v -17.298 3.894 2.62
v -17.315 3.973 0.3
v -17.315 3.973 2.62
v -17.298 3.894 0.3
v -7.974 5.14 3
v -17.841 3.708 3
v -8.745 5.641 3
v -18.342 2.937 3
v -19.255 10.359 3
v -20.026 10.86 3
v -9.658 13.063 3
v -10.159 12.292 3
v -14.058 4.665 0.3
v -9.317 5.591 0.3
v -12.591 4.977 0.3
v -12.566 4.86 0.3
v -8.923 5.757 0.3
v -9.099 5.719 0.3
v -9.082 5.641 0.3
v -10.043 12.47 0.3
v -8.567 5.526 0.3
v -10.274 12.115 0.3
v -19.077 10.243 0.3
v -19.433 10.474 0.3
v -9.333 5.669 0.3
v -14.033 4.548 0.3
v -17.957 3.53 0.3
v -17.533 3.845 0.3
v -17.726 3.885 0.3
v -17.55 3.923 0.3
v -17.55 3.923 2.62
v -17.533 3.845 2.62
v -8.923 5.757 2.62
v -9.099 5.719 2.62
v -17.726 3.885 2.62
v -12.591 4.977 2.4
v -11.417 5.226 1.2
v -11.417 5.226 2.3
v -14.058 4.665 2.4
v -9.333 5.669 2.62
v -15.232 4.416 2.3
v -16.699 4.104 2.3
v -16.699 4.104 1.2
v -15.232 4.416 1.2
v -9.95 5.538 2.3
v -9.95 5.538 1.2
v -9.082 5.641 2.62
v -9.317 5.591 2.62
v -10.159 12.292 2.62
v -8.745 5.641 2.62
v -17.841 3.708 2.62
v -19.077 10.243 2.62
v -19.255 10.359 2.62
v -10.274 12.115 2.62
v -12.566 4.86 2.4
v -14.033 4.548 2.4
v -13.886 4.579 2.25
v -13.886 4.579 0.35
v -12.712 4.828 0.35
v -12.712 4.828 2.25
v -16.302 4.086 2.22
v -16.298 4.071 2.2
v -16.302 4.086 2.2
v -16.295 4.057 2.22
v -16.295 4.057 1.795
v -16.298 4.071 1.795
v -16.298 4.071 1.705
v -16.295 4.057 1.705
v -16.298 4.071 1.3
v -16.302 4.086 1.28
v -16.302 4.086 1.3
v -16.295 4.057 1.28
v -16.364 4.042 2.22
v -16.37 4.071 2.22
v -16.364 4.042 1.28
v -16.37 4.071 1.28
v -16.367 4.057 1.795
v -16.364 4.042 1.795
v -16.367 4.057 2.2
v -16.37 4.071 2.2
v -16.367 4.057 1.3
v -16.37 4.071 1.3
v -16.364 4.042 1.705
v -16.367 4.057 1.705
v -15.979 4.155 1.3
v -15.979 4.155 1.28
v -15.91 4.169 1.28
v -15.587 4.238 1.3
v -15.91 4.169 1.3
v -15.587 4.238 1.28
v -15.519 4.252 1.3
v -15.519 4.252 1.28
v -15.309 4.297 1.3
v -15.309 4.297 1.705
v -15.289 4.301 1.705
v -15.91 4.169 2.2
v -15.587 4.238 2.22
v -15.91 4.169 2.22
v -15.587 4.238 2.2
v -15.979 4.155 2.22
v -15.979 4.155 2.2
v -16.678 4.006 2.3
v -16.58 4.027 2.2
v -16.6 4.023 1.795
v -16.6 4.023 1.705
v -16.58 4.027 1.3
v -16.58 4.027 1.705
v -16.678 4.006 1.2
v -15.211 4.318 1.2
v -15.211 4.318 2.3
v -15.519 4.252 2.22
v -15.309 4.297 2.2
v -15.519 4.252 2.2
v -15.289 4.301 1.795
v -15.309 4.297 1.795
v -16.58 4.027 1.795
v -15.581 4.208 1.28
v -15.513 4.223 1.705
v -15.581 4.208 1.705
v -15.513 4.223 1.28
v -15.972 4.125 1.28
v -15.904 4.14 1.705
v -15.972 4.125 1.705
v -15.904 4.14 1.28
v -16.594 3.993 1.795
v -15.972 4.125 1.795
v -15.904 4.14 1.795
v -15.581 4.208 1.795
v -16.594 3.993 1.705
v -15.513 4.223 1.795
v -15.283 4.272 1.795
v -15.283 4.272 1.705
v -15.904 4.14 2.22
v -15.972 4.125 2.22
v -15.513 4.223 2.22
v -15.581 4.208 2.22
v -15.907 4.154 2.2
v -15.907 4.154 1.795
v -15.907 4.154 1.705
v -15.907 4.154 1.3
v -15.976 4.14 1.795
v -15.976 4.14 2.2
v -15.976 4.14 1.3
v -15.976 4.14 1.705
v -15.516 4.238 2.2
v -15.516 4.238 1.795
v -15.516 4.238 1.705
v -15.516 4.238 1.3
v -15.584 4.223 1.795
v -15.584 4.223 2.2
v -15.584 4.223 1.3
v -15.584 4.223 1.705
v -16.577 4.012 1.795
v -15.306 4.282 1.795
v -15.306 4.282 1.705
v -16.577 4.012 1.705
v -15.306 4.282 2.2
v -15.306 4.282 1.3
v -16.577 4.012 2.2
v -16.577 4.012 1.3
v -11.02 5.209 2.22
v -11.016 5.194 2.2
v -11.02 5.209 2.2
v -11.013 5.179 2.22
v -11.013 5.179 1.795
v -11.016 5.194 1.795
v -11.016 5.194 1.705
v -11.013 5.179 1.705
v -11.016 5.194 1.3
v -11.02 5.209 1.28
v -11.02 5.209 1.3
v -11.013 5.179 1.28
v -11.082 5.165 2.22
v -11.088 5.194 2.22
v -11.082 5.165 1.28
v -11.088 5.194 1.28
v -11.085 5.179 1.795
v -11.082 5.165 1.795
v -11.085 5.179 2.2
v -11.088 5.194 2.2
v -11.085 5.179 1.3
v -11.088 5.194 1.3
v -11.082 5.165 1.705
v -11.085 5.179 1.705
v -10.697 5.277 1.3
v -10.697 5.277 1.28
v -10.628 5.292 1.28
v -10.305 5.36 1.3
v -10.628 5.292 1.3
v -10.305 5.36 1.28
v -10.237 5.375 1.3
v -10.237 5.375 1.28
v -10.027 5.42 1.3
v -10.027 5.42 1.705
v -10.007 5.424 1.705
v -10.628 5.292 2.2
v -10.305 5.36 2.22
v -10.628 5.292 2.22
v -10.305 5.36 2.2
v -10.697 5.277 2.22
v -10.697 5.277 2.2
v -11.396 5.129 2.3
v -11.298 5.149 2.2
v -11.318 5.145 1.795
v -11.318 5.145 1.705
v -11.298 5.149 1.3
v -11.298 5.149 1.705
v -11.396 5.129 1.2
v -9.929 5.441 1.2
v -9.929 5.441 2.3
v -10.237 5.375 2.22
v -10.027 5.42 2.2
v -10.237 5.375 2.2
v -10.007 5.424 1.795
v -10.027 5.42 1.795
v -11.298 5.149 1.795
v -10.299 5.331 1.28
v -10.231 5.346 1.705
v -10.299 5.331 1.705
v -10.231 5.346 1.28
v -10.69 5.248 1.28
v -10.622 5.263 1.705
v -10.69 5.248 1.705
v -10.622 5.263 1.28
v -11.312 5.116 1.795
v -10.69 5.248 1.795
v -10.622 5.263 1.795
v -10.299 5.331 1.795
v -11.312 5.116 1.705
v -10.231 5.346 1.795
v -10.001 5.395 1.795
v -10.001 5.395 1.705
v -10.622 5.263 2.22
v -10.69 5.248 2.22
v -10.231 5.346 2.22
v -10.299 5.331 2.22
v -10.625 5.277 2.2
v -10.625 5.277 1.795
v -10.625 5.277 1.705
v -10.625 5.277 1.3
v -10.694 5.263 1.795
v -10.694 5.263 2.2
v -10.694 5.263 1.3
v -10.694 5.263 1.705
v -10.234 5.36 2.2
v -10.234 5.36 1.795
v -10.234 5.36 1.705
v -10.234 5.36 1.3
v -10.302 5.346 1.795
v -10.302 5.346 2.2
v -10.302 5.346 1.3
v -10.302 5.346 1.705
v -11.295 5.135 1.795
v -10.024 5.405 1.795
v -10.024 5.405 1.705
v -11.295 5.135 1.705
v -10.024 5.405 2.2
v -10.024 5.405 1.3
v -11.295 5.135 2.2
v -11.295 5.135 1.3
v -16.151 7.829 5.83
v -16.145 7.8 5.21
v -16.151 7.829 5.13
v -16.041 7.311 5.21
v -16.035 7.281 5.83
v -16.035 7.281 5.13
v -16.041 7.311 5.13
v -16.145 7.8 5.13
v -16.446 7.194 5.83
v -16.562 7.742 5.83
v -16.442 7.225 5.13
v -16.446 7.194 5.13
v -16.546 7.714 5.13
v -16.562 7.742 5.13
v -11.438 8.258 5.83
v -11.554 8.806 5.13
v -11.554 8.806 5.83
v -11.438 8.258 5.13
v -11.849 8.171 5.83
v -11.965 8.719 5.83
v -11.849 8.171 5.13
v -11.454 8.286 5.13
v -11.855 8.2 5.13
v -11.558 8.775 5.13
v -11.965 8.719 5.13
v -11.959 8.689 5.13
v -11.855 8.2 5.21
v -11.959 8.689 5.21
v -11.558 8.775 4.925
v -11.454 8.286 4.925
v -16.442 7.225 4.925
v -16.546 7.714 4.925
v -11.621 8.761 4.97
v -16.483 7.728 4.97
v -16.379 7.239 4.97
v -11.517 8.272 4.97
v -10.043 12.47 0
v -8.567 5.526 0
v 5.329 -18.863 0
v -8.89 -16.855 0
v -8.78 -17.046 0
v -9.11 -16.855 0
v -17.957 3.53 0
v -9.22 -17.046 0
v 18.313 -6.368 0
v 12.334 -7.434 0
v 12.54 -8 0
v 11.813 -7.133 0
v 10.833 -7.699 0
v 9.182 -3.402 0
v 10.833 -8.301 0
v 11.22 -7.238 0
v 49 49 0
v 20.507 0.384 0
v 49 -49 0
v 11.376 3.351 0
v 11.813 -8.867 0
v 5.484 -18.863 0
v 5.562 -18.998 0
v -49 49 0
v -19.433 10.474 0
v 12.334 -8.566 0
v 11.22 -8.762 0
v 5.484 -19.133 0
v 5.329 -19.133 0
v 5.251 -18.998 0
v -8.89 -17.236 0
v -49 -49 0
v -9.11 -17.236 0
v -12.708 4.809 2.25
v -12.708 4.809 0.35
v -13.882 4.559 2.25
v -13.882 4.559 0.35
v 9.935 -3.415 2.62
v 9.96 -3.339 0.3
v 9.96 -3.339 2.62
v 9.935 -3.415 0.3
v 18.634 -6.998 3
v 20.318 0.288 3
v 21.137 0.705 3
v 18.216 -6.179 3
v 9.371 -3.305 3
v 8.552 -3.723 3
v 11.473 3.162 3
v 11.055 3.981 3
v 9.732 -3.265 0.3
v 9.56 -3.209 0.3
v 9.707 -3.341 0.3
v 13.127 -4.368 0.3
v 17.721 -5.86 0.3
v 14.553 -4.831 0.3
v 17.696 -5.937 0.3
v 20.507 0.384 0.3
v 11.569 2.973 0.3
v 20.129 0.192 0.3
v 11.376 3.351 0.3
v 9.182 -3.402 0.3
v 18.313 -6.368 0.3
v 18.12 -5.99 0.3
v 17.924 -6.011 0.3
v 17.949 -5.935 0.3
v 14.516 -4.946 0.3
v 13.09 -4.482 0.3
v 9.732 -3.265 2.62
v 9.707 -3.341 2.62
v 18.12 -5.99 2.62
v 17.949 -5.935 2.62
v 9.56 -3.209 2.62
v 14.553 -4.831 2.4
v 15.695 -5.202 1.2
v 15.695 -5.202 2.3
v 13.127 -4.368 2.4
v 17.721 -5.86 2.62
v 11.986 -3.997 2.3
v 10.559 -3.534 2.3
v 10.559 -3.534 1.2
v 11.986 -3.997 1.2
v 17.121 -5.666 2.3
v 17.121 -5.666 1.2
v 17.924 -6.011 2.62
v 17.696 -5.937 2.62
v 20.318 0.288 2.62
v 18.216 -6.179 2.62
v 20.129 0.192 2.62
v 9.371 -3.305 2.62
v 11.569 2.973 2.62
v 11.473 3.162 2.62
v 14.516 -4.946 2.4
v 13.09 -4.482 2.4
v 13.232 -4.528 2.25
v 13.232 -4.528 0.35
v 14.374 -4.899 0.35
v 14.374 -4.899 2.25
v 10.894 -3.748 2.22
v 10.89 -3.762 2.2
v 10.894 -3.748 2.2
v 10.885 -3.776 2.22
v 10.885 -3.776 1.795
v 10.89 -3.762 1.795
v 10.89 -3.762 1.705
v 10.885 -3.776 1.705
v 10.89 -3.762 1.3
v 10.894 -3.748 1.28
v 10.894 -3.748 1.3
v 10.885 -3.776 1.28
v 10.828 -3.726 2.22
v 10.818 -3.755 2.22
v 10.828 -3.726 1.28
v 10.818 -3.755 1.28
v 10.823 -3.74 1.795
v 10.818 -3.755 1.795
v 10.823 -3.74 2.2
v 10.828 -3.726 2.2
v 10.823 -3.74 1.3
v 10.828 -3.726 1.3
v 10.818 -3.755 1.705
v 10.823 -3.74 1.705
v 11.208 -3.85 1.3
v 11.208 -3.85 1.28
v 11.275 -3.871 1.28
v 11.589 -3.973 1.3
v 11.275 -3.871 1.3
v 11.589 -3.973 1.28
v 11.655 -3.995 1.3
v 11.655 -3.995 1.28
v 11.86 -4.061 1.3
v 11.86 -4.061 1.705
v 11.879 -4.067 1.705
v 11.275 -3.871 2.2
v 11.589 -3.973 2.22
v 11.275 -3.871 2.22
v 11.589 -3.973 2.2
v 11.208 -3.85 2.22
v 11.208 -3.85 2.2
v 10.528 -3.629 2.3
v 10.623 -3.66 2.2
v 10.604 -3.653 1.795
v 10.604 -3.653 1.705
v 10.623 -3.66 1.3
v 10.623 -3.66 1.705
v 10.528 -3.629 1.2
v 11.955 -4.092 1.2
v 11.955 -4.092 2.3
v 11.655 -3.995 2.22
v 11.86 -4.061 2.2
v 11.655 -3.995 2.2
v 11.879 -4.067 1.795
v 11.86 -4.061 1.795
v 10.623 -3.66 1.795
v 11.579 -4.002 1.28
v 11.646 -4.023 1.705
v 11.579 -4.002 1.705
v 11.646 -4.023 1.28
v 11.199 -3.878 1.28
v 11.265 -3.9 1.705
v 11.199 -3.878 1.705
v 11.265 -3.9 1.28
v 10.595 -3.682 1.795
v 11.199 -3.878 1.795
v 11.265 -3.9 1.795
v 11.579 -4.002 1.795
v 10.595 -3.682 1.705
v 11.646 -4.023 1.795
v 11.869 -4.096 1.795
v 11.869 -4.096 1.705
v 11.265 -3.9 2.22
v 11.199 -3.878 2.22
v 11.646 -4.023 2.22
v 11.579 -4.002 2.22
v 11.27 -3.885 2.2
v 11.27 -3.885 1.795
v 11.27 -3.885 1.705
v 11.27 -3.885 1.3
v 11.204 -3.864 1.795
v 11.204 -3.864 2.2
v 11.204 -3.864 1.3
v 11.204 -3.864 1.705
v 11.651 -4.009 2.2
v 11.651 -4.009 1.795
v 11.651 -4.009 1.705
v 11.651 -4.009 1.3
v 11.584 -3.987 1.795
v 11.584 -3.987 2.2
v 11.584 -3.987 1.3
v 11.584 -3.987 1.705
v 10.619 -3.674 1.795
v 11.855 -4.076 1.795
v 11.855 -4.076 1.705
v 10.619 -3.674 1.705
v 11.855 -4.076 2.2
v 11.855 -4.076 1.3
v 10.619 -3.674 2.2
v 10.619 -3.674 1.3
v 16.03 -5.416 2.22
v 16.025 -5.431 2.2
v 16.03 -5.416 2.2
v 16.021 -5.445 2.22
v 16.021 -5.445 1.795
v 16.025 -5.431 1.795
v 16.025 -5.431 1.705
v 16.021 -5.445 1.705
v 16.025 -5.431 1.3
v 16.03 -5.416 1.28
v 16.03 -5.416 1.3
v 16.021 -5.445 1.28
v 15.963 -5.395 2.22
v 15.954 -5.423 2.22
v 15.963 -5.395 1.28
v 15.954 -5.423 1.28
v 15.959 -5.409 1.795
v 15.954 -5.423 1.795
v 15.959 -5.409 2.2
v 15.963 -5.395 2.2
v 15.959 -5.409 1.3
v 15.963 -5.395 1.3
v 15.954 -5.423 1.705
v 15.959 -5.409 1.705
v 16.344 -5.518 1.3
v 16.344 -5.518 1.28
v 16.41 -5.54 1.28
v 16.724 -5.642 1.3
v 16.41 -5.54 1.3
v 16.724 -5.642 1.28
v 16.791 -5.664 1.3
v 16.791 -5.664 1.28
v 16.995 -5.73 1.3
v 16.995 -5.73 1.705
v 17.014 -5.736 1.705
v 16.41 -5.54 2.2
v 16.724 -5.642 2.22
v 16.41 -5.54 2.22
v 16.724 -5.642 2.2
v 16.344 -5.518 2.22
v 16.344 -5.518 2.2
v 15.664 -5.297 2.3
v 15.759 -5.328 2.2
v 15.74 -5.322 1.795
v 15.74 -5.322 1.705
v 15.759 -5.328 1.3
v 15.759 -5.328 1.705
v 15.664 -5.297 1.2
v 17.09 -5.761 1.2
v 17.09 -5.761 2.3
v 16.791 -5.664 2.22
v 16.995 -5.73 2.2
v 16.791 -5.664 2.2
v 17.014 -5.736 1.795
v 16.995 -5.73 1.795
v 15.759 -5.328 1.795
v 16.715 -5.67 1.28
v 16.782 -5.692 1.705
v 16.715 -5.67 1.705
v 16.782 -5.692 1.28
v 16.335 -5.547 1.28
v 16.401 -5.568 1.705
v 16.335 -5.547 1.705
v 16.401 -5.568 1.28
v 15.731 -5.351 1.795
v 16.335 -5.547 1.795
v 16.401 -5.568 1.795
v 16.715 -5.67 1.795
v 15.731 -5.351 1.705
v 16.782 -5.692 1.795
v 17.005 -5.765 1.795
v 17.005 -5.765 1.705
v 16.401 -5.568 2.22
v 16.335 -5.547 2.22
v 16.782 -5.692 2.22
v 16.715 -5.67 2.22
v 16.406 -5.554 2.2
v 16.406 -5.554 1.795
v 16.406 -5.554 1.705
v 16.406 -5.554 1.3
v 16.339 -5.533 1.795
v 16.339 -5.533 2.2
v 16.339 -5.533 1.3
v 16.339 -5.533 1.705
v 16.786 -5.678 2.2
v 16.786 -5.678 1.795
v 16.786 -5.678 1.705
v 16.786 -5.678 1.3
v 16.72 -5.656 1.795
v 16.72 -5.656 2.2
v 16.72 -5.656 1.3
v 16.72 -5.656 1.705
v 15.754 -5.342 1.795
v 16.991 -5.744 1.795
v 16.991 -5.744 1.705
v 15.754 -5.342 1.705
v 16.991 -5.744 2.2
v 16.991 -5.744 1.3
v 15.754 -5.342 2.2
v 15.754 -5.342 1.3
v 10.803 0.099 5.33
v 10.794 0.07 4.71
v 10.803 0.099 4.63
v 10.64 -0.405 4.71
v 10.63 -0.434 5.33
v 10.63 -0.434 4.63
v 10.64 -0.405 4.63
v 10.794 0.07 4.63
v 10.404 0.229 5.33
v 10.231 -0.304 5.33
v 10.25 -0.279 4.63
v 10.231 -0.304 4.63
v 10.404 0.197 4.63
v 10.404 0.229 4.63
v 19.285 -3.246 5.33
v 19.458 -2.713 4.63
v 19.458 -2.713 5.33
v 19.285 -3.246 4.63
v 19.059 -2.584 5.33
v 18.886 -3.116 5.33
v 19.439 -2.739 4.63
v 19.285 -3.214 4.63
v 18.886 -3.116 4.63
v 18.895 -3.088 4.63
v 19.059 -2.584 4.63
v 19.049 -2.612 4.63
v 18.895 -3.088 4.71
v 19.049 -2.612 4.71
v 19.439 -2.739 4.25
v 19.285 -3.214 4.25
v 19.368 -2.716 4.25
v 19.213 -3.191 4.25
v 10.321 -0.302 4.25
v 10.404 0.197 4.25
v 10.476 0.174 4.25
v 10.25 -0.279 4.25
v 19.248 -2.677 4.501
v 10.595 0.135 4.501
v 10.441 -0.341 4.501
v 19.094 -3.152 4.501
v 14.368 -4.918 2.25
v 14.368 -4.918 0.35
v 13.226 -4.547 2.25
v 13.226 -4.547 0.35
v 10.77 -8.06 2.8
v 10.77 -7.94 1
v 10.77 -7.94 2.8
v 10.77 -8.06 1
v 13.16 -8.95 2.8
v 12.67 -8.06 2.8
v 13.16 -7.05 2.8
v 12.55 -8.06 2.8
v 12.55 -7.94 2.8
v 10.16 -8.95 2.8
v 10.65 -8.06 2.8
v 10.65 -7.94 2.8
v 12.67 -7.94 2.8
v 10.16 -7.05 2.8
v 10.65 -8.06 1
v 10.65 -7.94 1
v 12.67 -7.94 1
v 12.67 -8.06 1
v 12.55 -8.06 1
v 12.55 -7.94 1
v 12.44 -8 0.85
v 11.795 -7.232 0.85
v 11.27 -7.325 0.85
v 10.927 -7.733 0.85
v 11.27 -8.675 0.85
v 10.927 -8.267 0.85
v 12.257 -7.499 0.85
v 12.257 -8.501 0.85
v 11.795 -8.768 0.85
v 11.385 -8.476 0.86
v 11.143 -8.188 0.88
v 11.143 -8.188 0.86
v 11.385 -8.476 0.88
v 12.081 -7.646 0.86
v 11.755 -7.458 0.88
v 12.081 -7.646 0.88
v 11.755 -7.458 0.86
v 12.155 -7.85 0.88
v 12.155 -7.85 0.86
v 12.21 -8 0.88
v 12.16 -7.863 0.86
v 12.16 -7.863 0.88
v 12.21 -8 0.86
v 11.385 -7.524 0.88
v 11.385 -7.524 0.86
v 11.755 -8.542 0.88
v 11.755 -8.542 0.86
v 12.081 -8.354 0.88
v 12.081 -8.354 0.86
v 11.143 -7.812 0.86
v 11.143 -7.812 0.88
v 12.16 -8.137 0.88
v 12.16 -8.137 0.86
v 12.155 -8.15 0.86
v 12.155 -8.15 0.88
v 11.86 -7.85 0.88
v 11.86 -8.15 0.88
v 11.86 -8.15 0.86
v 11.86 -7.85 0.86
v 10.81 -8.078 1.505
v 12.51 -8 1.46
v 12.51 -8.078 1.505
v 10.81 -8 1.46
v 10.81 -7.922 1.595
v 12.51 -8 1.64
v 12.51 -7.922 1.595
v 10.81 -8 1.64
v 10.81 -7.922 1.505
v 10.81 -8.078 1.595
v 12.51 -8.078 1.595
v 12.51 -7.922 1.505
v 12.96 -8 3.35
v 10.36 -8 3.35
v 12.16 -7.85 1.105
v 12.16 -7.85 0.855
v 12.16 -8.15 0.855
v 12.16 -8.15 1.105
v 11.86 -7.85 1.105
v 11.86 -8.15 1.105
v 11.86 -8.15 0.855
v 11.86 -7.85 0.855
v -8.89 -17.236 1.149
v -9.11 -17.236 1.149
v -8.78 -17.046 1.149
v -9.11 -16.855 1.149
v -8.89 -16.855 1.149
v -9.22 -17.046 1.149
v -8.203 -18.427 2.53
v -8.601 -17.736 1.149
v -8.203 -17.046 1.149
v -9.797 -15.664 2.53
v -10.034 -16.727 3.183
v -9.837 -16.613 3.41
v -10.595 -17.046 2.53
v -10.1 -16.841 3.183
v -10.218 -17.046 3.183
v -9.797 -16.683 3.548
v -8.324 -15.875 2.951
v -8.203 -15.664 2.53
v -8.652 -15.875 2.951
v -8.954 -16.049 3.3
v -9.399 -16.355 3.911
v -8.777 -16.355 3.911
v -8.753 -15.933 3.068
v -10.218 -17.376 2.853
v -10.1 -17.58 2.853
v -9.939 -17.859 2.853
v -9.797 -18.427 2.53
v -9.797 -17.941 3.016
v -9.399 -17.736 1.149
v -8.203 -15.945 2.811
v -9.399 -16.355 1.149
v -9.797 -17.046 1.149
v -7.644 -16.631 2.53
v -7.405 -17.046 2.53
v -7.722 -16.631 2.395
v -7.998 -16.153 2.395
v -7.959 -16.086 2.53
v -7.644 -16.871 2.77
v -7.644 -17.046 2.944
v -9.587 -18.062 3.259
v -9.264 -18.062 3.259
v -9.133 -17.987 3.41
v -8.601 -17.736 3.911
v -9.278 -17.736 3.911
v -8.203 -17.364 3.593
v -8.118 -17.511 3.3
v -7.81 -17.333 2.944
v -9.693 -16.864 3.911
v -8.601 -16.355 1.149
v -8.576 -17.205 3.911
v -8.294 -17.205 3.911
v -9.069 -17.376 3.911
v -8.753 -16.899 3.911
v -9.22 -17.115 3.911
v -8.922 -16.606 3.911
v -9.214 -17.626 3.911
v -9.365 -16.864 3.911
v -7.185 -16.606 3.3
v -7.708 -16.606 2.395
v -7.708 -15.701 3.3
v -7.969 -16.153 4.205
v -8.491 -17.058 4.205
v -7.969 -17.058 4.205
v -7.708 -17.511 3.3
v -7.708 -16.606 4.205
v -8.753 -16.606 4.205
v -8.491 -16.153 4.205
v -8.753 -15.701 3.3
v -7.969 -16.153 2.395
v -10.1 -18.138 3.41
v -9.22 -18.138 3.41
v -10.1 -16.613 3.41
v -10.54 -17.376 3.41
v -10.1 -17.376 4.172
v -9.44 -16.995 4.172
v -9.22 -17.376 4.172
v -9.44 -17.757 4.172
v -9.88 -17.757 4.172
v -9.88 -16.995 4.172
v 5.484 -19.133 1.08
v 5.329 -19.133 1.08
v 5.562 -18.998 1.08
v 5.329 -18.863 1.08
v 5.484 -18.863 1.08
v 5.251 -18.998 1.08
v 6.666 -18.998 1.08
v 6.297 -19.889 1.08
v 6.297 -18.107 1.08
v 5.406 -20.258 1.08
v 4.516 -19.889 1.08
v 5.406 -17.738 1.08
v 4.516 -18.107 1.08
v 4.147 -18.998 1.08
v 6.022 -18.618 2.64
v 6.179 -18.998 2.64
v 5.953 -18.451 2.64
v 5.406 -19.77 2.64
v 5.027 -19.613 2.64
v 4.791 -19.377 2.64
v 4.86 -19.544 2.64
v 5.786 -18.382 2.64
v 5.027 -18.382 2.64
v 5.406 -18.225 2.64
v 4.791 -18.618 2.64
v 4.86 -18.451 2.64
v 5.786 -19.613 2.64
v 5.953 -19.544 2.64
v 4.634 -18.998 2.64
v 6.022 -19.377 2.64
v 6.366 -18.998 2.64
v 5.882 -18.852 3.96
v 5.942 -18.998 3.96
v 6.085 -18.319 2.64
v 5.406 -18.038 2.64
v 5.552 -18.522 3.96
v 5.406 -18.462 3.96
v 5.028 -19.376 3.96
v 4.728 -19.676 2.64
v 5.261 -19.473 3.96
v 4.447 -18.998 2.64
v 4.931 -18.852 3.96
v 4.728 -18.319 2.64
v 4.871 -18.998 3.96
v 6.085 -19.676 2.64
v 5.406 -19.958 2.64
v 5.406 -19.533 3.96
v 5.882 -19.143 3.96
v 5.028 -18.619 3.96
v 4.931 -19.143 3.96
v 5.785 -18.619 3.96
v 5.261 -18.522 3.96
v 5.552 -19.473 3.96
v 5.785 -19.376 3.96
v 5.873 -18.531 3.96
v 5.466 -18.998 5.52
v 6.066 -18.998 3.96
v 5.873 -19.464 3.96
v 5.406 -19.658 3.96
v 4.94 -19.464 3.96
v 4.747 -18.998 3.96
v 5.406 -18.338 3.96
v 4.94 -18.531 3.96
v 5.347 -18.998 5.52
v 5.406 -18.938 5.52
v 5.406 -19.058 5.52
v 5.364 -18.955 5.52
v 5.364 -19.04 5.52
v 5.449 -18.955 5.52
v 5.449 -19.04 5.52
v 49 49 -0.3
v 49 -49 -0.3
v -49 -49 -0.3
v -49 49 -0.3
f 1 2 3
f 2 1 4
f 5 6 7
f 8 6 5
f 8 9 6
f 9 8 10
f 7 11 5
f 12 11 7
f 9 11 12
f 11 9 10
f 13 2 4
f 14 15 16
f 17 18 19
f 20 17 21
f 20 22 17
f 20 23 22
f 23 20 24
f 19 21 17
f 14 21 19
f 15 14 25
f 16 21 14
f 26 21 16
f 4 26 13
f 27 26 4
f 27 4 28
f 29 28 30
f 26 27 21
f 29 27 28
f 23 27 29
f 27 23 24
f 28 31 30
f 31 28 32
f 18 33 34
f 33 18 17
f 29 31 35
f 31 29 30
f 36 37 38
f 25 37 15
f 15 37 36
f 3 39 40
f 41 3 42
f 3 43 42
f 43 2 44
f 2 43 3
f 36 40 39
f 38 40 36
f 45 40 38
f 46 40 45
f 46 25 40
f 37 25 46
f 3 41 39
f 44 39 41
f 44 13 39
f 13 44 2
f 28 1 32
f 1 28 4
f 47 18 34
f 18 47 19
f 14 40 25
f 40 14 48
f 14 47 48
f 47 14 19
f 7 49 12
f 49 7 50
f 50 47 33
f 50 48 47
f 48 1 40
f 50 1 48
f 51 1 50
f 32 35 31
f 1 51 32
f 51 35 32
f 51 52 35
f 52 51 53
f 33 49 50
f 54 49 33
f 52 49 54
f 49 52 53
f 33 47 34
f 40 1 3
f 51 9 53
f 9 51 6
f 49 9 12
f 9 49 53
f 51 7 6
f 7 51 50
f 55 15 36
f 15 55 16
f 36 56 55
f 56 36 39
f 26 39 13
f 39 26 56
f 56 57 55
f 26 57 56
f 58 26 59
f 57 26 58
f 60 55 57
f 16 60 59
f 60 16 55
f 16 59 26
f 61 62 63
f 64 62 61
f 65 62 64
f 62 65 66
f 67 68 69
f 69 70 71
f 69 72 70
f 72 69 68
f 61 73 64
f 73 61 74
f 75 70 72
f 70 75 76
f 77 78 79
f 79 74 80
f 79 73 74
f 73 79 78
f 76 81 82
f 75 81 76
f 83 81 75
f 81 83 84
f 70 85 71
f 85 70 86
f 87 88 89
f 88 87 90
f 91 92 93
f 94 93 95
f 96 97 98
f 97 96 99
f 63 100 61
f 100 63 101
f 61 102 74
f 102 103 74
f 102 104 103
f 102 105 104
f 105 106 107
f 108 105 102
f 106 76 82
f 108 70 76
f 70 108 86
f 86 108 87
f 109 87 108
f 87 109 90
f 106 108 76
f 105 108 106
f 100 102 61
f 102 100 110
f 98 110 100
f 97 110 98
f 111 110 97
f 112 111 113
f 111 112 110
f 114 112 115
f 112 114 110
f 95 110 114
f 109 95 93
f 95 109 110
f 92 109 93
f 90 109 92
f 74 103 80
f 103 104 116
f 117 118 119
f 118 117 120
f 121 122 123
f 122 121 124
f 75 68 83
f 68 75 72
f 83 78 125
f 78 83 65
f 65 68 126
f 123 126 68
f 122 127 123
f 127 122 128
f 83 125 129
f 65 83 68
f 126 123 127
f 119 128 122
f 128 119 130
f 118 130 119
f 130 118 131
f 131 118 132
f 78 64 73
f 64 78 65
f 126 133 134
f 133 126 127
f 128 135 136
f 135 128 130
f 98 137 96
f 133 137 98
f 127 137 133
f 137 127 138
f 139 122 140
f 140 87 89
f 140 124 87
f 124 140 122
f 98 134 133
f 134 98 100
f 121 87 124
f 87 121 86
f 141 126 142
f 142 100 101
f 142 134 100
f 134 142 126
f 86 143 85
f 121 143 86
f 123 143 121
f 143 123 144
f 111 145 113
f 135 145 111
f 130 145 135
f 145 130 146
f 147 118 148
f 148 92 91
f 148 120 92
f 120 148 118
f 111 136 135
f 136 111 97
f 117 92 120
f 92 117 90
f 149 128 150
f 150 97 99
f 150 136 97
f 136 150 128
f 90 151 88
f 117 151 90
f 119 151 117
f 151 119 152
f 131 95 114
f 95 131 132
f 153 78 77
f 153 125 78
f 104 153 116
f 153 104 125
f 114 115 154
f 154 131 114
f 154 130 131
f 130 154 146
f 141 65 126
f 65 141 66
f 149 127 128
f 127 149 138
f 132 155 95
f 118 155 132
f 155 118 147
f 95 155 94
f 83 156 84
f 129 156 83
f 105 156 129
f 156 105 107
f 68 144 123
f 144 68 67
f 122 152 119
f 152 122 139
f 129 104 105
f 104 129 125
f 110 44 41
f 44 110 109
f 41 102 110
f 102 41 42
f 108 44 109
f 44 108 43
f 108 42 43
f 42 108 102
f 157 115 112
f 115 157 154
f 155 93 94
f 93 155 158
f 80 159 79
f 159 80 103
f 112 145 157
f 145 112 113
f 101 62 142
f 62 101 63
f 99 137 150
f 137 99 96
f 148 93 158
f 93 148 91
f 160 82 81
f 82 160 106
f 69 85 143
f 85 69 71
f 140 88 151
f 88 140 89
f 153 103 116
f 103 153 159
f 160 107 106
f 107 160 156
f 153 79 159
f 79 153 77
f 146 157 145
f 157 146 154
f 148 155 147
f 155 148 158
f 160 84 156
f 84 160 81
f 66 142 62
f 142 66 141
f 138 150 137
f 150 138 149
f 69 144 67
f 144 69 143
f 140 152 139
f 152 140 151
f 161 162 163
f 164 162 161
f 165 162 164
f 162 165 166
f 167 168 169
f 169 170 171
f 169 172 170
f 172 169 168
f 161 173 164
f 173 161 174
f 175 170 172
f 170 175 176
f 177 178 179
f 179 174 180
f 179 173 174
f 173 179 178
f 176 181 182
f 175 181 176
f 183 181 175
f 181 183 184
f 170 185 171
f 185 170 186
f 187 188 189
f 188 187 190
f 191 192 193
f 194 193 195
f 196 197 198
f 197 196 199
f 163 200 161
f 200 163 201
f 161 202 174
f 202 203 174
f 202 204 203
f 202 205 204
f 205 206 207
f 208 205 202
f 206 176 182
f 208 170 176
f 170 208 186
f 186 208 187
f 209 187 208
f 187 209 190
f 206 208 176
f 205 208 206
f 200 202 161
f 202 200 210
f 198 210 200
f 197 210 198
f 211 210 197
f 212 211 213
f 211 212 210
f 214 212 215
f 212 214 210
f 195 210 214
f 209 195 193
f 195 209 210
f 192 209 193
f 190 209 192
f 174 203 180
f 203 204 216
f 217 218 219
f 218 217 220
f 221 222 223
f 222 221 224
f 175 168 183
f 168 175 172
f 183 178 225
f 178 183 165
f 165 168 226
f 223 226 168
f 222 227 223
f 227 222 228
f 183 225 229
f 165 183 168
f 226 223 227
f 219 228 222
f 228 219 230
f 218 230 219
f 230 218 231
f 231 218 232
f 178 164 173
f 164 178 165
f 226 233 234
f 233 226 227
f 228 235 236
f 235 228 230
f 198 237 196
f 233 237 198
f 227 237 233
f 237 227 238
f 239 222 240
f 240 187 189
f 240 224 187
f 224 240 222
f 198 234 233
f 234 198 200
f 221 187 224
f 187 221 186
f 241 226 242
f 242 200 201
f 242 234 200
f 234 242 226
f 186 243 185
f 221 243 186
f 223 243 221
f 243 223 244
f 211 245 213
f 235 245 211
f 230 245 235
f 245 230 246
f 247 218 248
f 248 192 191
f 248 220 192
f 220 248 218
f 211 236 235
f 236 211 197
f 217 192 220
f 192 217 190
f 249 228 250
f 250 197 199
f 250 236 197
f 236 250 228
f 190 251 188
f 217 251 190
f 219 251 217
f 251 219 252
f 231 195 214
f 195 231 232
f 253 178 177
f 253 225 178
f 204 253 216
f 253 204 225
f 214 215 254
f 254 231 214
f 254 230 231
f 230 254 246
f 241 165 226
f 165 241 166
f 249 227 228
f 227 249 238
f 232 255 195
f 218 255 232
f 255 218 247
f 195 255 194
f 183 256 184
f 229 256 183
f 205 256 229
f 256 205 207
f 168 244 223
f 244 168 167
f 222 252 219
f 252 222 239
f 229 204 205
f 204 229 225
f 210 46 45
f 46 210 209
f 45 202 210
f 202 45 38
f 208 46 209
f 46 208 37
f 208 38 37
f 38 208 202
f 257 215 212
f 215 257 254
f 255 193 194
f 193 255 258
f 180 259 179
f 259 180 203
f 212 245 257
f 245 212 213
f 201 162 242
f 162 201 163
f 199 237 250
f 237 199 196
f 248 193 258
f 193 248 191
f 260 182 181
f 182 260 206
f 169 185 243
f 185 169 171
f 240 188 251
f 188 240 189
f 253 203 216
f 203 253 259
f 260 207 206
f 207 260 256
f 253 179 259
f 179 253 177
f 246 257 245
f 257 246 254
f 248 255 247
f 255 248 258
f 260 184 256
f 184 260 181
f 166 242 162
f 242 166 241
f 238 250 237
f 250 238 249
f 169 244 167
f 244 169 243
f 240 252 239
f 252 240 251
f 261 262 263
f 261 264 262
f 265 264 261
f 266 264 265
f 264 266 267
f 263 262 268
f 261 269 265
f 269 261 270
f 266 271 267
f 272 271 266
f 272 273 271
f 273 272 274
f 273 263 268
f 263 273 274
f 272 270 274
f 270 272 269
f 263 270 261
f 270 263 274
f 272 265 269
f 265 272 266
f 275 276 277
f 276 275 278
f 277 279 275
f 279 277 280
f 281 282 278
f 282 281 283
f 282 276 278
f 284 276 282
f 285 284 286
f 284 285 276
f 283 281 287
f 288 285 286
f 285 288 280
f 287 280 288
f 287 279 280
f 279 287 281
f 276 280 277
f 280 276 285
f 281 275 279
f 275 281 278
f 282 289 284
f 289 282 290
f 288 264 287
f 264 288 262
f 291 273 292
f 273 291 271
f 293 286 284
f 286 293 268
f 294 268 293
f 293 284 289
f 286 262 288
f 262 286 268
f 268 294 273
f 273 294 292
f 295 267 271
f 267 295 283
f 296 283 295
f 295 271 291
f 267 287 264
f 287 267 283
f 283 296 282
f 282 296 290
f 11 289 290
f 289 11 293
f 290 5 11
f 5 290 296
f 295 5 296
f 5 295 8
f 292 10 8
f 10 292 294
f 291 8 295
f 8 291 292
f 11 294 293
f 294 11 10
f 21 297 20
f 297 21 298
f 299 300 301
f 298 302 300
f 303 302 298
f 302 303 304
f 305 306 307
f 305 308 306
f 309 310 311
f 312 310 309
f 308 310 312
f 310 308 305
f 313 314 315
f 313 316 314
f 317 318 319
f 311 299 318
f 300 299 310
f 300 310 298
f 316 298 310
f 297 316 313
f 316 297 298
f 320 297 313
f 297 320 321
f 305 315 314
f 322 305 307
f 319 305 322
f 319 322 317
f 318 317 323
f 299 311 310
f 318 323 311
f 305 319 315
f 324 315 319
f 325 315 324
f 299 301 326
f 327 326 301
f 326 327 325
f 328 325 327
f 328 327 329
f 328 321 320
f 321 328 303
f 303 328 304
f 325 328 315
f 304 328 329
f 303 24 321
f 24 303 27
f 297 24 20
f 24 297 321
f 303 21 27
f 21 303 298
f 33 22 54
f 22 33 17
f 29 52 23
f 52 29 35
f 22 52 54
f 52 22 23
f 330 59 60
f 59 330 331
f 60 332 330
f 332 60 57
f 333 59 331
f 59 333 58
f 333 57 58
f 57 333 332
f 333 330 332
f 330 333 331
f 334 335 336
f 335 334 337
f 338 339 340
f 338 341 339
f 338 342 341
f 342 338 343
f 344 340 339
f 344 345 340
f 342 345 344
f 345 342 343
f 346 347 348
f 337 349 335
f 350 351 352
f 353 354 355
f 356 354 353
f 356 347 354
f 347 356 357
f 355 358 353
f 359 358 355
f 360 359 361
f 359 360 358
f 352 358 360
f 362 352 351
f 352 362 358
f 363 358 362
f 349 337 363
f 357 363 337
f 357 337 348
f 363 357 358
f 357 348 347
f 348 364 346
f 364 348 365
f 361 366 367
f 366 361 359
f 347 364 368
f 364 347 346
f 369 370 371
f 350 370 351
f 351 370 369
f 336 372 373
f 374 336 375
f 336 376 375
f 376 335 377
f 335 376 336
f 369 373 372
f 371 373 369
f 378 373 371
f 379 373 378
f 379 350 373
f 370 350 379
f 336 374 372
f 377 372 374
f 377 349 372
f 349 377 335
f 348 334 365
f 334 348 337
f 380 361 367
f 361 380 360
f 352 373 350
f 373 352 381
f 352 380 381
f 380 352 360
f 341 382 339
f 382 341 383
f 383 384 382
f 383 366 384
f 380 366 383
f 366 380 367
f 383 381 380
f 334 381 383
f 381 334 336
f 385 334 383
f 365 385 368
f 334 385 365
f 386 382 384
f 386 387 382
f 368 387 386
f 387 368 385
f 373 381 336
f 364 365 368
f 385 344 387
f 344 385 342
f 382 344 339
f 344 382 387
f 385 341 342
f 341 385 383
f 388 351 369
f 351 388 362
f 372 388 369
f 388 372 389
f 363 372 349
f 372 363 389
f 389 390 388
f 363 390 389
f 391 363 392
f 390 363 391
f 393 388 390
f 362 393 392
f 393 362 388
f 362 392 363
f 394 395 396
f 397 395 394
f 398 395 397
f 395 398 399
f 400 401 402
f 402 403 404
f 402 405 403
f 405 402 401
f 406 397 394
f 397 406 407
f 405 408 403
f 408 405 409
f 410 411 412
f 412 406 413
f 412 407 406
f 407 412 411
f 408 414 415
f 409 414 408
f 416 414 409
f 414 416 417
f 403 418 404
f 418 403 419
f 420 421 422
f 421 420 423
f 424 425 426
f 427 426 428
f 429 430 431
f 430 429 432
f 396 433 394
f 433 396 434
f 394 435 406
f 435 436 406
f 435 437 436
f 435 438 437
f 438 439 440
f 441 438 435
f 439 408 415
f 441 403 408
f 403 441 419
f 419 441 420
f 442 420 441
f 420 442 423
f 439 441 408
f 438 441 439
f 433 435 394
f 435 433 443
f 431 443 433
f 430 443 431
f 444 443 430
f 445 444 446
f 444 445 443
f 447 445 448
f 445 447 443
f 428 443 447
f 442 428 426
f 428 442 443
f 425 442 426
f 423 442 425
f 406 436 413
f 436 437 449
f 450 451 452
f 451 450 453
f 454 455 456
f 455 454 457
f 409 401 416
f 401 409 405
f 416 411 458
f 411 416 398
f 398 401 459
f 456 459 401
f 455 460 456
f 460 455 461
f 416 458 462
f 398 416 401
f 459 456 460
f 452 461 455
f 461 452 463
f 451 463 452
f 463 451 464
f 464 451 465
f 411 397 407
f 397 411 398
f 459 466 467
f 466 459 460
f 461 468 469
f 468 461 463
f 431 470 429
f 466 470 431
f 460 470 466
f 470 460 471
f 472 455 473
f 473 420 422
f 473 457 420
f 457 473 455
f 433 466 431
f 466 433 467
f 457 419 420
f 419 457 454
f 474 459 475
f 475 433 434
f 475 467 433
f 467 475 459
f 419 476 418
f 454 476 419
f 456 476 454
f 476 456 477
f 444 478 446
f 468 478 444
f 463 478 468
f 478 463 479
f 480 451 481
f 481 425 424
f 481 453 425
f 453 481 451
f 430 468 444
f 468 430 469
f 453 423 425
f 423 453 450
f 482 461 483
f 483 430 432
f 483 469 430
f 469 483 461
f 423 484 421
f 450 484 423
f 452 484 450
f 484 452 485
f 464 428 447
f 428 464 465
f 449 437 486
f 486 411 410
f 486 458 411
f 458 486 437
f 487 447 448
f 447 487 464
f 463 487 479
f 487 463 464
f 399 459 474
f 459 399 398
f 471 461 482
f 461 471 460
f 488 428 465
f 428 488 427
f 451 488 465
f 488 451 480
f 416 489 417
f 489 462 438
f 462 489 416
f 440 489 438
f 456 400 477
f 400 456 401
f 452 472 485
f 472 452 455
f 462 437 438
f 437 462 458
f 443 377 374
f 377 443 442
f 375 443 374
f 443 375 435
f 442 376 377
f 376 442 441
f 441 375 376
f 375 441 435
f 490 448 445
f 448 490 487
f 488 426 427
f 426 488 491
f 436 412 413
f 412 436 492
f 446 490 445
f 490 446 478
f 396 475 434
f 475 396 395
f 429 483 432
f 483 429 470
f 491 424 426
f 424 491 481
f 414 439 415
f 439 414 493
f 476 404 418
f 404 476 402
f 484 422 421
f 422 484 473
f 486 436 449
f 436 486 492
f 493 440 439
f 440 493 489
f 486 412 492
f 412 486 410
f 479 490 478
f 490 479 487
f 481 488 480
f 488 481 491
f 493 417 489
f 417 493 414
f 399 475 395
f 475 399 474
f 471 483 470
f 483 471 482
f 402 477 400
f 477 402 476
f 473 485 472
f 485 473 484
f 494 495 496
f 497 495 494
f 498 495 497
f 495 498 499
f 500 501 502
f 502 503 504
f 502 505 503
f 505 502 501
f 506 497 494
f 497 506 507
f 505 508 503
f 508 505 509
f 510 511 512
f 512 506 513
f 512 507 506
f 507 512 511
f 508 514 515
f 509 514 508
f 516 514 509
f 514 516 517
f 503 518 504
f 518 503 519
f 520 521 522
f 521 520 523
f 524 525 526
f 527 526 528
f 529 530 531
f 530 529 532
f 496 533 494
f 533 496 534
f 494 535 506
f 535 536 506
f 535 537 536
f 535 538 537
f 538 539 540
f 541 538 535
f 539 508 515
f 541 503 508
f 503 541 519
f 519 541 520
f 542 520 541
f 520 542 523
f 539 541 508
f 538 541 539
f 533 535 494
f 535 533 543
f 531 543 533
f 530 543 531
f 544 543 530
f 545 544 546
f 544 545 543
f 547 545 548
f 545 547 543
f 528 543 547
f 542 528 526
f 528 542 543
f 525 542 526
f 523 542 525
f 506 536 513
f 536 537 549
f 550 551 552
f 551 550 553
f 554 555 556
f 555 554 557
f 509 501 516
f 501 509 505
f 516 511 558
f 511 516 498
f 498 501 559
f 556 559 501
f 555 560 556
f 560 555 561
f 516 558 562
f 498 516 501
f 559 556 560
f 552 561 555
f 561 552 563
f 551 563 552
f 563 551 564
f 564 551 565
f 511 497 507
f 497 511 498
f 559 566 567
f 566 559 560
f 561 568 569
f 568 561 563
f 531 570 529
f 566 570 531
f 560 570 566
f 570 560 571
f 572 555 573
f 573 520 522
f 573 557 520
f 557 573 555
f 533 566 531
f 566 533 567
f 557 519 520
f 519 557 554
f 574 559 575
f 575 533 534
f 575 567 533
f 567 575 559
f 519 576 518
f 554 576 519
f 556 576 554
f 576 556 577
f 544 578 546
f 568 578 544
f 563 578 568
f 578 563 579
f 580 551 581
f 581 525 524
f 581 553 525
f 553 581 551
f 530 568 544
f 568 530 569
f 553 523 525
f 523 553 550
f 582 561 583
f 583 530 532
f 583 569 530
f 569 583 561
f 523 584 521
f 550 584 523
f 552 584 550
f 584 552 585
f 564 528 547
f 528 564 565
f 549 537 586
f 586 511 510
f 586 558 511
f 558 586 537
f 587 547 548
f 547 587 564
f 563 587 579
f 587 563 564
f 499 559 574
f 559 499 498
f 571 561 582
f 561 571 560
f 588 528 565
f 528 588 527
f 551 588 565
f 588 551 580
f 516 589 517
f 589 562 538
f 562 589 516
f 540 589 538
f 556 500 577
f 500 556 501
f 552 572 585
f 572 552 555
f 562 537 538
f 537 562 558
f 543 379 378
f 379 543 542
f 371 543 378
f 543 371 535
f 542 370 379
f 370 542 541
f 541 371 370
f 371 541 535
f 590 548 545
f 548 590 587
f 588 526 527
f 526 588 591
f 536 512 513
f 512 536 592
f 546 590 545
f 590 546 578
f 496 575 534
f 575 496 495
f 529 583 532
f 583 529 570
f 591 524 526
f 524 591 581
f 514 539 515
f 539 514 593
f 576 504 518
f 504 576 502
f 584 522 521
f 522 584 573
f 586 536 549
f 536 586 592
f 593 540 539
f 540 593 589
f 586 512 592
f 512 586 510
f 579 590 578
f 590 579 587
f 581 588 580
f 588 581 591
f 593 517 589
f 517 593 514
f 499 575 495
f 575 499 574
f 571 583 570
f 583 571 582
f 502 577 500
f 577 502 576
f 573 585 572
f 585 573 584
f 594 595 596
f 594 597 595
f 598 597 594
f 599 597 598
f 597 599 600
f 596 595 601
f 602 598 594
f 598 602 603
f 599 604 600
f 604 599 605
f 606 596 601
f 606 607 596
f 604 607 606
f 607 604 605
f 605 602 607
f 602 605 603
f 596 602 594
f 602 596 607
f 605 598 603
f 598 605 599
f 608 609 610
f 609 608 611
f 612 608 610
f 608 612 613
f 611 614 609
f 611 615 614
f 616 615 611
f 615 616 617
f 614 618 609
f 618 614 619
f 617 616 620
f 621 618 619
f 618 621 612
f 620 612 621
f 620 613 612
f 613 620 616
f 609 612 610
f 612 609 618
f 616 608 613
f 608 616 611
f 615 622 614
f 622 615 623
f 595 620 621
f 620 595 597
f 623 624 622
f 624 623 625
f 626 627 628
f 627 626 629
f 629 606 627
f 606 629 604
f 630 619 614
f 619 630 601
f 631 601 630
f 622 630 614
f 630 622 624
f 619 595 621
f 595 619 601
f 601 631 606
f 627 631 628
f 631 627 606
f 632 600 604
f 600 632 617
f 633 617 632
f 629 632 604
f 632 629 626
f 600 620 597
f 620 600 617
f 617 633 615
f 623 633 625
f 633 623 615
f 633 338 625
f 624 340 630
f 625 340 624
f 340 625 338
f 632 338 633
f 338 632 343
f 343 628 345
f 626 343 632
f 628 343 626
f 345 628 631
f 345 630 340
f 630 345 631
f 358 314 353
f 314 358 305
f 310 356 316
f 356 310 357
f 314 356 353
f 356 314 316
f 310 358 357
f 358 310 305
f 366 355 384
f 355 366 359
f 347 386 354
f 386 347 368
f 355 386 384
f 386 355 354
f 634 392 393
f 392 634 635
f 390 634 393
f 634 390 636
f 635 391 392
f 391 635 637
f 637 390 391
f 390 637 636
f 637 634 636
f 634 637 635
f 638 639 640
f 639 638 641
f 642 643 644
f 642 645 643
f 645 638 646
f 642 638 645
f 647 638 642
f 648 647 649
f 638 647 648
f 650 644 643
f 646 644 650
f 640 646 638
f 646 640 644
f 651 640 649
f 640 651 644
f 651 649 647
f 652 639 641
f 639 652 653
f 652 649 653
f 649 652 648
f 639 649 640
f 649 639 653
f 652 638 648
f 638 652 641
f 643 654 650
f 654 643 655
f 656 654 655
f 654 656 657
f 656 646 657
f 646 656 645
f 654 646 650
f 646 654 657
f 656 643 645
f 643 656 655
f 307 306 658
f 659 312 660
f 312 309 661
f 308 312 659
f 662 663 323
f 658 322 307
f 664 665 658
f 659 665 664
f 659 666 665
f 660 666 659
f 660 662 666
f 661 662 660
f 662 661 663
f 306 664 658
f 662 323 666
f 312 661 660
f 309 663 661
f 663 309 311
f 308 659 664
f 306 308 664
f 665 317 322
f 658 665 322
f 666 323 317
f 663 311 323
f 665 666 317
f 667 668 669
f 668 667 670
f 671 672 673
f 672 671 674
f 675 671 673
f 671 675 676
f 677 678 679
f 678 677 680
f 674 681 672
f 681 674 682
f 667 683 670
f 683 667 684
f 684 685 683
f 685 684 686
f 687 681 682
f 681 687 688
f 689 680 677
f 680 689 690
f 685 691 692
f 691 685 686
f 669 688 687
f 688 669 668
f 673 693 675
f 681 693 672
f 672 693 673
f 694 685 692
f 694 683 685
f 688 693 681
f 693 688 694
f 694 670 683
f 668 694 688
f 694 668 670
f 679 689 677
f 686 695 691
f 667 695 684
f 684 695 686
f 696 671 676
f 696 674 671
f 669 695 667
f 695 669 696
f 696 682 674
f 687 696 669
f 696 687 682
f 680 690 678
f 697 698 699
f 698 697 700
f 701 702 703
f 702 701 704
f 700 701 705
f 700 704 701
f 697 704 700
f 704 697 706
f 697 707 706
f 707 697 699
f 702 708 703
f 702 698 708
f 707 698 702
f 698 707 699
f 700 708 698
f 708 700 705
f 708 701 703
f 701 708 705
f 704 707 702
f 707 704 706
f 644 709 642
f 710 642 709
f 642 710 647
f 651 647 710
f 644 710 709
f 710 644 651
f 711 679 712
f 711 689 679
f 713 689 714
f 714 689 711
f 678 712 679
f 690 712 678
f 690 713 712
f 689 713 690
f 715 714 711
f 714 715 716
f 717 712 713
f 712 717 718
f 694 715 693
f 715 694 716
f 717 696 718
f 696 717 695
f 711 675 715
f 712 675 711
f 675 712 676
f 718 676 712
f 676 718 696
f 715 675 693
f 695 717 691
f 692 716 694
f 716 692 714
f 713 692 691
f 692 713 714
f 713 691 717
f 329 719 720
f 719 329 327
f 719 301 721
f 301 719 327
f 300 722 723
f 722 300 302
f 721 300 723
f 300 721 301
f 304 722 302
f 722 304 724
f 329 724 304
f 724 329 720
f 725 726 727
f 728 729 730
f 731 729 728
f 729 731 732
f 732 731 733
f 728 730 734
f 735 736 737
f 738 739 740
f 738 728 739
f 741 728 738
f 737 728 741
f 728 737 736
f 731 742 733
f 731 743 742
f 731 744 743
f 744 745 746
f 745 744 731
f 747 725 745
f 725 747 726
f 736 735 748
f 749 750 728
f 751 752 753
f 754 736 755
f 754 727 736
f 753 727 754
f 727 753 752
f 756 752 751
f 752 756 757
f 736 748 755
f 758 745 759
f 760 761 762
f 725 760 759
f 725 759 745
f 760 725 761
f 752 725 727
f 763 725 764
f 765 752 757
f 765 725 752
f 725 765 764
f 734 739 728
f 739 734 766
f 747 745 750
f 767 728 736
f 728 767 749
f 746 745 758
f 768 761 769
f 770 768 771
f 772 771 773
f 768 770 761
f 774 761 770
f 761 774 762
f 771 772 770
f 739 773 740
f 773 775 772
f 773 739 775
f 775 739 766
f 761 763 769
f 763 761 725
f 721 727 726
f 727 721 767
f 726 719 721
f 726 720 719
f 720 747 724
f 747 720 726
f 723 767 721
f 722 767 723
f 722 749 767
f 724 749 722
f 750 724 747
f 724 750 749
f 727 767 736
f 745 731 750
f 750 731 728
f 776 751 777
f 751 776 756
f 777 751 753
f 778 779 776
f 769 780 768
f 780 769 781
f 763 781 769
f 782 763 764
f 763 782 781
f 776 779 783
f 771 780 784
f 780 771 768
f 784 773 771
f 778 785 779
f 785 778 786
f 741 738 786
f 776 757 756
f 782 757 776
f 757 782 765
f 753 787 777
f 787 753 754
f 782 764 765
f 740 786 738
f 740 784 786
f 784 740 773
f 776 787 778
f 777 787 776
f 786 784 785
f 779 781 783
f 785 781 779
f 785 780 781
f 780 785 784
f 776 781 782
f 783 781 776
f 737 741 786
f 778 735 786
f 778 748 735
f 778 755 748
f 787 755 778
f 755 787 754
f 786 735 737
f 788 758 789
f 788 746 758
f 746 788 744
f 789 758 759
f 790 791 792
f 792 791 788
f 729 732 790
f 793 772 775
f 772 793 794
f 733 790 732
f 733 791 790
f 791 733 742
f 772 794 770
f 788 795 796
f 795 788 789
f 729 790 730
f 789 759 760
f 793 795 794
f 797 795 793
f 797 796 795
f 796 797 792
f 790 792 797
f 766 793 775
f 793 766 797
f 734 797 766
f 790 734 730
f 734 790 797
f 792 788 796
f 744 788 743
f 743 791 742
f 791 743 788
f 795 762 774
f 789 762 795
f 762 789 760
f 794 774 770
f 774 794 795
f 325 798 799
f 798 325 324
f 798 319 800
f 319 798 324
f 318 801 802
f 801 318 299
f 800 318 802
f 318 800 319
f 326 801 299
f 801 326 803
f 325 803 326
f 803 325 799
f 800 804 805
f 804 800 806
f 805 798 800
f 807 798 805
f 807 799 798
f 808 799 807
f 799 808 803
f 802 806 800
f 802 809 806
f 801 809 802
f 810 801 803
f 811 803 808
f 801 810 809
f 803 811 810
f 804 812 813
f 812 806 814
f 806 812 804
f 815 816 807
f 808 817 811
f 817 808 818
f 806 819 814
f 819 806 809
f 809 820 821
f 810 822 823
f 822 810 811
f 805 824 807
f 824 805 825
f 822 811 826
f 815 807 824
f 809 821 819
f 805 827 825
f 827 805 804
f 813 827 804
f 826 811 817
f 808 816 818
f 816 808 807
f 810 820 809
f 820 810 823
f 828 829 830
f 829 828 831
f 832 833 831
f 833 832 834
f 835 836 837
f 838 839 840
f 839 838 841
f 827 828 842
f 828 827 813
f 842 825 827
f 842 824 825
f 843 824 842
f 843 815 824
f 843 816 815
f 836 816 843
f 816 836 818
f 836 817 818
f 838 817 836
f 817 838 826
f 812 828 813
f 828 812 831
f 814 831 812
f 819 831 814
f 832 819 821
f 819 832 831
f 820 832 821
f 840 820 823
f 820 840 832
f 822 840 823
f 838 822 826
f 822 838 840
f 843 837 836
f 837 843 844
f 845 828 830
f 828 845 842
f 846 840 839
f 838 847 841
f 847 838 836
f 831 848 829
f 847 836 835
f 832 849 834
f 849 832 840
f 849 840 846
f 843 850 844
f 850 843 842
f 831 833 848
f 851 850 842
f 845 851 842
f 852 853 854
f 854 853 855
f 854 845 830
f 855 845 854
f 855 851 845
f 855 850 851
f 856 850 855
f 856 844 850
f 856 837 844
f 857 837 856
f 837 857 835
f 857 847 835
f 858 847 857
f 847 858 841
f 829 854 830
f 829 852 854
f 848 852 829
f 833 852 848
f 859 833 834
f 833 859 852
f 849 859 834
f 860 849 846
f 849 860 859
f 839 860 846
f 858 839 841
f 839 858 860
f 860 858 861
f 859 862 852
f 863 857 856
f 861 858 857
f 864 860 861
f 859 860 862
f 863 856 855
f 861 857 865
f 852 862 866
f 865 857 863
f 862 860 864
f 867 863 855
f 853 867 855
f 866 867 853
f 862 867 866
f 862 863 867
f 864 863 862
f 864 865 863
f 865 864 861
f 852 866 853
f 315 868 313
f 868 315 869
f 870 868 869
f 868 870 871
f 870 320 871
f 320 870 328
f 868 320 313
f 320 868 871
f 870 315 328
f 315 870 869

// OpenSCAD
// generated by ScadLibrary scene assembly
// This flat placement format can be reopened in the Scene Assembly object editor.
$fn = 12;
use <../lib/kit_old_city.scad>
use <../lib/kit_city_hd.scad>

color([0.50, 0.51, 0.53]) translate([0, 0, -0.15]) cube([98.0, 98.0, 0.3], center = true);

translate([-14.0000, 8.0000, 0.0000]) rotate([0.0000, 0.0000, 12.0000]) scale([1.00000, 1.00000, 1.00000]) oc_bldg_house(seed = 3);
translate([14.8445, -1.5087, 0.0000]) rotate([0.0000, 0.0000, -18.0000]) scale([1.00000, 1.00000, 1.00000]) oc_bldg_house(seed = 7);
translate([11.6598, -8.0000, 0.0000]) rotate([0.0000, -0.0000, 0.0000]) scale([1.00000, 1.00000, 1.00000]) oc_prop_well();
translate([-9.0000, -17.0456, 0.0000]) rotate([0.0000, -0.0000, 0.0000]) scale([1.10000, 1.10000, 1.10000]) hc_nature_tree(1.0, 4);
translate([5.4065, -18.9976, 0.0000]) rotate([0.0000, -0.0000, 0.0000]) scale([1.20000, 1.20000, 1.20000]) oc_nature_pine(1.0);
